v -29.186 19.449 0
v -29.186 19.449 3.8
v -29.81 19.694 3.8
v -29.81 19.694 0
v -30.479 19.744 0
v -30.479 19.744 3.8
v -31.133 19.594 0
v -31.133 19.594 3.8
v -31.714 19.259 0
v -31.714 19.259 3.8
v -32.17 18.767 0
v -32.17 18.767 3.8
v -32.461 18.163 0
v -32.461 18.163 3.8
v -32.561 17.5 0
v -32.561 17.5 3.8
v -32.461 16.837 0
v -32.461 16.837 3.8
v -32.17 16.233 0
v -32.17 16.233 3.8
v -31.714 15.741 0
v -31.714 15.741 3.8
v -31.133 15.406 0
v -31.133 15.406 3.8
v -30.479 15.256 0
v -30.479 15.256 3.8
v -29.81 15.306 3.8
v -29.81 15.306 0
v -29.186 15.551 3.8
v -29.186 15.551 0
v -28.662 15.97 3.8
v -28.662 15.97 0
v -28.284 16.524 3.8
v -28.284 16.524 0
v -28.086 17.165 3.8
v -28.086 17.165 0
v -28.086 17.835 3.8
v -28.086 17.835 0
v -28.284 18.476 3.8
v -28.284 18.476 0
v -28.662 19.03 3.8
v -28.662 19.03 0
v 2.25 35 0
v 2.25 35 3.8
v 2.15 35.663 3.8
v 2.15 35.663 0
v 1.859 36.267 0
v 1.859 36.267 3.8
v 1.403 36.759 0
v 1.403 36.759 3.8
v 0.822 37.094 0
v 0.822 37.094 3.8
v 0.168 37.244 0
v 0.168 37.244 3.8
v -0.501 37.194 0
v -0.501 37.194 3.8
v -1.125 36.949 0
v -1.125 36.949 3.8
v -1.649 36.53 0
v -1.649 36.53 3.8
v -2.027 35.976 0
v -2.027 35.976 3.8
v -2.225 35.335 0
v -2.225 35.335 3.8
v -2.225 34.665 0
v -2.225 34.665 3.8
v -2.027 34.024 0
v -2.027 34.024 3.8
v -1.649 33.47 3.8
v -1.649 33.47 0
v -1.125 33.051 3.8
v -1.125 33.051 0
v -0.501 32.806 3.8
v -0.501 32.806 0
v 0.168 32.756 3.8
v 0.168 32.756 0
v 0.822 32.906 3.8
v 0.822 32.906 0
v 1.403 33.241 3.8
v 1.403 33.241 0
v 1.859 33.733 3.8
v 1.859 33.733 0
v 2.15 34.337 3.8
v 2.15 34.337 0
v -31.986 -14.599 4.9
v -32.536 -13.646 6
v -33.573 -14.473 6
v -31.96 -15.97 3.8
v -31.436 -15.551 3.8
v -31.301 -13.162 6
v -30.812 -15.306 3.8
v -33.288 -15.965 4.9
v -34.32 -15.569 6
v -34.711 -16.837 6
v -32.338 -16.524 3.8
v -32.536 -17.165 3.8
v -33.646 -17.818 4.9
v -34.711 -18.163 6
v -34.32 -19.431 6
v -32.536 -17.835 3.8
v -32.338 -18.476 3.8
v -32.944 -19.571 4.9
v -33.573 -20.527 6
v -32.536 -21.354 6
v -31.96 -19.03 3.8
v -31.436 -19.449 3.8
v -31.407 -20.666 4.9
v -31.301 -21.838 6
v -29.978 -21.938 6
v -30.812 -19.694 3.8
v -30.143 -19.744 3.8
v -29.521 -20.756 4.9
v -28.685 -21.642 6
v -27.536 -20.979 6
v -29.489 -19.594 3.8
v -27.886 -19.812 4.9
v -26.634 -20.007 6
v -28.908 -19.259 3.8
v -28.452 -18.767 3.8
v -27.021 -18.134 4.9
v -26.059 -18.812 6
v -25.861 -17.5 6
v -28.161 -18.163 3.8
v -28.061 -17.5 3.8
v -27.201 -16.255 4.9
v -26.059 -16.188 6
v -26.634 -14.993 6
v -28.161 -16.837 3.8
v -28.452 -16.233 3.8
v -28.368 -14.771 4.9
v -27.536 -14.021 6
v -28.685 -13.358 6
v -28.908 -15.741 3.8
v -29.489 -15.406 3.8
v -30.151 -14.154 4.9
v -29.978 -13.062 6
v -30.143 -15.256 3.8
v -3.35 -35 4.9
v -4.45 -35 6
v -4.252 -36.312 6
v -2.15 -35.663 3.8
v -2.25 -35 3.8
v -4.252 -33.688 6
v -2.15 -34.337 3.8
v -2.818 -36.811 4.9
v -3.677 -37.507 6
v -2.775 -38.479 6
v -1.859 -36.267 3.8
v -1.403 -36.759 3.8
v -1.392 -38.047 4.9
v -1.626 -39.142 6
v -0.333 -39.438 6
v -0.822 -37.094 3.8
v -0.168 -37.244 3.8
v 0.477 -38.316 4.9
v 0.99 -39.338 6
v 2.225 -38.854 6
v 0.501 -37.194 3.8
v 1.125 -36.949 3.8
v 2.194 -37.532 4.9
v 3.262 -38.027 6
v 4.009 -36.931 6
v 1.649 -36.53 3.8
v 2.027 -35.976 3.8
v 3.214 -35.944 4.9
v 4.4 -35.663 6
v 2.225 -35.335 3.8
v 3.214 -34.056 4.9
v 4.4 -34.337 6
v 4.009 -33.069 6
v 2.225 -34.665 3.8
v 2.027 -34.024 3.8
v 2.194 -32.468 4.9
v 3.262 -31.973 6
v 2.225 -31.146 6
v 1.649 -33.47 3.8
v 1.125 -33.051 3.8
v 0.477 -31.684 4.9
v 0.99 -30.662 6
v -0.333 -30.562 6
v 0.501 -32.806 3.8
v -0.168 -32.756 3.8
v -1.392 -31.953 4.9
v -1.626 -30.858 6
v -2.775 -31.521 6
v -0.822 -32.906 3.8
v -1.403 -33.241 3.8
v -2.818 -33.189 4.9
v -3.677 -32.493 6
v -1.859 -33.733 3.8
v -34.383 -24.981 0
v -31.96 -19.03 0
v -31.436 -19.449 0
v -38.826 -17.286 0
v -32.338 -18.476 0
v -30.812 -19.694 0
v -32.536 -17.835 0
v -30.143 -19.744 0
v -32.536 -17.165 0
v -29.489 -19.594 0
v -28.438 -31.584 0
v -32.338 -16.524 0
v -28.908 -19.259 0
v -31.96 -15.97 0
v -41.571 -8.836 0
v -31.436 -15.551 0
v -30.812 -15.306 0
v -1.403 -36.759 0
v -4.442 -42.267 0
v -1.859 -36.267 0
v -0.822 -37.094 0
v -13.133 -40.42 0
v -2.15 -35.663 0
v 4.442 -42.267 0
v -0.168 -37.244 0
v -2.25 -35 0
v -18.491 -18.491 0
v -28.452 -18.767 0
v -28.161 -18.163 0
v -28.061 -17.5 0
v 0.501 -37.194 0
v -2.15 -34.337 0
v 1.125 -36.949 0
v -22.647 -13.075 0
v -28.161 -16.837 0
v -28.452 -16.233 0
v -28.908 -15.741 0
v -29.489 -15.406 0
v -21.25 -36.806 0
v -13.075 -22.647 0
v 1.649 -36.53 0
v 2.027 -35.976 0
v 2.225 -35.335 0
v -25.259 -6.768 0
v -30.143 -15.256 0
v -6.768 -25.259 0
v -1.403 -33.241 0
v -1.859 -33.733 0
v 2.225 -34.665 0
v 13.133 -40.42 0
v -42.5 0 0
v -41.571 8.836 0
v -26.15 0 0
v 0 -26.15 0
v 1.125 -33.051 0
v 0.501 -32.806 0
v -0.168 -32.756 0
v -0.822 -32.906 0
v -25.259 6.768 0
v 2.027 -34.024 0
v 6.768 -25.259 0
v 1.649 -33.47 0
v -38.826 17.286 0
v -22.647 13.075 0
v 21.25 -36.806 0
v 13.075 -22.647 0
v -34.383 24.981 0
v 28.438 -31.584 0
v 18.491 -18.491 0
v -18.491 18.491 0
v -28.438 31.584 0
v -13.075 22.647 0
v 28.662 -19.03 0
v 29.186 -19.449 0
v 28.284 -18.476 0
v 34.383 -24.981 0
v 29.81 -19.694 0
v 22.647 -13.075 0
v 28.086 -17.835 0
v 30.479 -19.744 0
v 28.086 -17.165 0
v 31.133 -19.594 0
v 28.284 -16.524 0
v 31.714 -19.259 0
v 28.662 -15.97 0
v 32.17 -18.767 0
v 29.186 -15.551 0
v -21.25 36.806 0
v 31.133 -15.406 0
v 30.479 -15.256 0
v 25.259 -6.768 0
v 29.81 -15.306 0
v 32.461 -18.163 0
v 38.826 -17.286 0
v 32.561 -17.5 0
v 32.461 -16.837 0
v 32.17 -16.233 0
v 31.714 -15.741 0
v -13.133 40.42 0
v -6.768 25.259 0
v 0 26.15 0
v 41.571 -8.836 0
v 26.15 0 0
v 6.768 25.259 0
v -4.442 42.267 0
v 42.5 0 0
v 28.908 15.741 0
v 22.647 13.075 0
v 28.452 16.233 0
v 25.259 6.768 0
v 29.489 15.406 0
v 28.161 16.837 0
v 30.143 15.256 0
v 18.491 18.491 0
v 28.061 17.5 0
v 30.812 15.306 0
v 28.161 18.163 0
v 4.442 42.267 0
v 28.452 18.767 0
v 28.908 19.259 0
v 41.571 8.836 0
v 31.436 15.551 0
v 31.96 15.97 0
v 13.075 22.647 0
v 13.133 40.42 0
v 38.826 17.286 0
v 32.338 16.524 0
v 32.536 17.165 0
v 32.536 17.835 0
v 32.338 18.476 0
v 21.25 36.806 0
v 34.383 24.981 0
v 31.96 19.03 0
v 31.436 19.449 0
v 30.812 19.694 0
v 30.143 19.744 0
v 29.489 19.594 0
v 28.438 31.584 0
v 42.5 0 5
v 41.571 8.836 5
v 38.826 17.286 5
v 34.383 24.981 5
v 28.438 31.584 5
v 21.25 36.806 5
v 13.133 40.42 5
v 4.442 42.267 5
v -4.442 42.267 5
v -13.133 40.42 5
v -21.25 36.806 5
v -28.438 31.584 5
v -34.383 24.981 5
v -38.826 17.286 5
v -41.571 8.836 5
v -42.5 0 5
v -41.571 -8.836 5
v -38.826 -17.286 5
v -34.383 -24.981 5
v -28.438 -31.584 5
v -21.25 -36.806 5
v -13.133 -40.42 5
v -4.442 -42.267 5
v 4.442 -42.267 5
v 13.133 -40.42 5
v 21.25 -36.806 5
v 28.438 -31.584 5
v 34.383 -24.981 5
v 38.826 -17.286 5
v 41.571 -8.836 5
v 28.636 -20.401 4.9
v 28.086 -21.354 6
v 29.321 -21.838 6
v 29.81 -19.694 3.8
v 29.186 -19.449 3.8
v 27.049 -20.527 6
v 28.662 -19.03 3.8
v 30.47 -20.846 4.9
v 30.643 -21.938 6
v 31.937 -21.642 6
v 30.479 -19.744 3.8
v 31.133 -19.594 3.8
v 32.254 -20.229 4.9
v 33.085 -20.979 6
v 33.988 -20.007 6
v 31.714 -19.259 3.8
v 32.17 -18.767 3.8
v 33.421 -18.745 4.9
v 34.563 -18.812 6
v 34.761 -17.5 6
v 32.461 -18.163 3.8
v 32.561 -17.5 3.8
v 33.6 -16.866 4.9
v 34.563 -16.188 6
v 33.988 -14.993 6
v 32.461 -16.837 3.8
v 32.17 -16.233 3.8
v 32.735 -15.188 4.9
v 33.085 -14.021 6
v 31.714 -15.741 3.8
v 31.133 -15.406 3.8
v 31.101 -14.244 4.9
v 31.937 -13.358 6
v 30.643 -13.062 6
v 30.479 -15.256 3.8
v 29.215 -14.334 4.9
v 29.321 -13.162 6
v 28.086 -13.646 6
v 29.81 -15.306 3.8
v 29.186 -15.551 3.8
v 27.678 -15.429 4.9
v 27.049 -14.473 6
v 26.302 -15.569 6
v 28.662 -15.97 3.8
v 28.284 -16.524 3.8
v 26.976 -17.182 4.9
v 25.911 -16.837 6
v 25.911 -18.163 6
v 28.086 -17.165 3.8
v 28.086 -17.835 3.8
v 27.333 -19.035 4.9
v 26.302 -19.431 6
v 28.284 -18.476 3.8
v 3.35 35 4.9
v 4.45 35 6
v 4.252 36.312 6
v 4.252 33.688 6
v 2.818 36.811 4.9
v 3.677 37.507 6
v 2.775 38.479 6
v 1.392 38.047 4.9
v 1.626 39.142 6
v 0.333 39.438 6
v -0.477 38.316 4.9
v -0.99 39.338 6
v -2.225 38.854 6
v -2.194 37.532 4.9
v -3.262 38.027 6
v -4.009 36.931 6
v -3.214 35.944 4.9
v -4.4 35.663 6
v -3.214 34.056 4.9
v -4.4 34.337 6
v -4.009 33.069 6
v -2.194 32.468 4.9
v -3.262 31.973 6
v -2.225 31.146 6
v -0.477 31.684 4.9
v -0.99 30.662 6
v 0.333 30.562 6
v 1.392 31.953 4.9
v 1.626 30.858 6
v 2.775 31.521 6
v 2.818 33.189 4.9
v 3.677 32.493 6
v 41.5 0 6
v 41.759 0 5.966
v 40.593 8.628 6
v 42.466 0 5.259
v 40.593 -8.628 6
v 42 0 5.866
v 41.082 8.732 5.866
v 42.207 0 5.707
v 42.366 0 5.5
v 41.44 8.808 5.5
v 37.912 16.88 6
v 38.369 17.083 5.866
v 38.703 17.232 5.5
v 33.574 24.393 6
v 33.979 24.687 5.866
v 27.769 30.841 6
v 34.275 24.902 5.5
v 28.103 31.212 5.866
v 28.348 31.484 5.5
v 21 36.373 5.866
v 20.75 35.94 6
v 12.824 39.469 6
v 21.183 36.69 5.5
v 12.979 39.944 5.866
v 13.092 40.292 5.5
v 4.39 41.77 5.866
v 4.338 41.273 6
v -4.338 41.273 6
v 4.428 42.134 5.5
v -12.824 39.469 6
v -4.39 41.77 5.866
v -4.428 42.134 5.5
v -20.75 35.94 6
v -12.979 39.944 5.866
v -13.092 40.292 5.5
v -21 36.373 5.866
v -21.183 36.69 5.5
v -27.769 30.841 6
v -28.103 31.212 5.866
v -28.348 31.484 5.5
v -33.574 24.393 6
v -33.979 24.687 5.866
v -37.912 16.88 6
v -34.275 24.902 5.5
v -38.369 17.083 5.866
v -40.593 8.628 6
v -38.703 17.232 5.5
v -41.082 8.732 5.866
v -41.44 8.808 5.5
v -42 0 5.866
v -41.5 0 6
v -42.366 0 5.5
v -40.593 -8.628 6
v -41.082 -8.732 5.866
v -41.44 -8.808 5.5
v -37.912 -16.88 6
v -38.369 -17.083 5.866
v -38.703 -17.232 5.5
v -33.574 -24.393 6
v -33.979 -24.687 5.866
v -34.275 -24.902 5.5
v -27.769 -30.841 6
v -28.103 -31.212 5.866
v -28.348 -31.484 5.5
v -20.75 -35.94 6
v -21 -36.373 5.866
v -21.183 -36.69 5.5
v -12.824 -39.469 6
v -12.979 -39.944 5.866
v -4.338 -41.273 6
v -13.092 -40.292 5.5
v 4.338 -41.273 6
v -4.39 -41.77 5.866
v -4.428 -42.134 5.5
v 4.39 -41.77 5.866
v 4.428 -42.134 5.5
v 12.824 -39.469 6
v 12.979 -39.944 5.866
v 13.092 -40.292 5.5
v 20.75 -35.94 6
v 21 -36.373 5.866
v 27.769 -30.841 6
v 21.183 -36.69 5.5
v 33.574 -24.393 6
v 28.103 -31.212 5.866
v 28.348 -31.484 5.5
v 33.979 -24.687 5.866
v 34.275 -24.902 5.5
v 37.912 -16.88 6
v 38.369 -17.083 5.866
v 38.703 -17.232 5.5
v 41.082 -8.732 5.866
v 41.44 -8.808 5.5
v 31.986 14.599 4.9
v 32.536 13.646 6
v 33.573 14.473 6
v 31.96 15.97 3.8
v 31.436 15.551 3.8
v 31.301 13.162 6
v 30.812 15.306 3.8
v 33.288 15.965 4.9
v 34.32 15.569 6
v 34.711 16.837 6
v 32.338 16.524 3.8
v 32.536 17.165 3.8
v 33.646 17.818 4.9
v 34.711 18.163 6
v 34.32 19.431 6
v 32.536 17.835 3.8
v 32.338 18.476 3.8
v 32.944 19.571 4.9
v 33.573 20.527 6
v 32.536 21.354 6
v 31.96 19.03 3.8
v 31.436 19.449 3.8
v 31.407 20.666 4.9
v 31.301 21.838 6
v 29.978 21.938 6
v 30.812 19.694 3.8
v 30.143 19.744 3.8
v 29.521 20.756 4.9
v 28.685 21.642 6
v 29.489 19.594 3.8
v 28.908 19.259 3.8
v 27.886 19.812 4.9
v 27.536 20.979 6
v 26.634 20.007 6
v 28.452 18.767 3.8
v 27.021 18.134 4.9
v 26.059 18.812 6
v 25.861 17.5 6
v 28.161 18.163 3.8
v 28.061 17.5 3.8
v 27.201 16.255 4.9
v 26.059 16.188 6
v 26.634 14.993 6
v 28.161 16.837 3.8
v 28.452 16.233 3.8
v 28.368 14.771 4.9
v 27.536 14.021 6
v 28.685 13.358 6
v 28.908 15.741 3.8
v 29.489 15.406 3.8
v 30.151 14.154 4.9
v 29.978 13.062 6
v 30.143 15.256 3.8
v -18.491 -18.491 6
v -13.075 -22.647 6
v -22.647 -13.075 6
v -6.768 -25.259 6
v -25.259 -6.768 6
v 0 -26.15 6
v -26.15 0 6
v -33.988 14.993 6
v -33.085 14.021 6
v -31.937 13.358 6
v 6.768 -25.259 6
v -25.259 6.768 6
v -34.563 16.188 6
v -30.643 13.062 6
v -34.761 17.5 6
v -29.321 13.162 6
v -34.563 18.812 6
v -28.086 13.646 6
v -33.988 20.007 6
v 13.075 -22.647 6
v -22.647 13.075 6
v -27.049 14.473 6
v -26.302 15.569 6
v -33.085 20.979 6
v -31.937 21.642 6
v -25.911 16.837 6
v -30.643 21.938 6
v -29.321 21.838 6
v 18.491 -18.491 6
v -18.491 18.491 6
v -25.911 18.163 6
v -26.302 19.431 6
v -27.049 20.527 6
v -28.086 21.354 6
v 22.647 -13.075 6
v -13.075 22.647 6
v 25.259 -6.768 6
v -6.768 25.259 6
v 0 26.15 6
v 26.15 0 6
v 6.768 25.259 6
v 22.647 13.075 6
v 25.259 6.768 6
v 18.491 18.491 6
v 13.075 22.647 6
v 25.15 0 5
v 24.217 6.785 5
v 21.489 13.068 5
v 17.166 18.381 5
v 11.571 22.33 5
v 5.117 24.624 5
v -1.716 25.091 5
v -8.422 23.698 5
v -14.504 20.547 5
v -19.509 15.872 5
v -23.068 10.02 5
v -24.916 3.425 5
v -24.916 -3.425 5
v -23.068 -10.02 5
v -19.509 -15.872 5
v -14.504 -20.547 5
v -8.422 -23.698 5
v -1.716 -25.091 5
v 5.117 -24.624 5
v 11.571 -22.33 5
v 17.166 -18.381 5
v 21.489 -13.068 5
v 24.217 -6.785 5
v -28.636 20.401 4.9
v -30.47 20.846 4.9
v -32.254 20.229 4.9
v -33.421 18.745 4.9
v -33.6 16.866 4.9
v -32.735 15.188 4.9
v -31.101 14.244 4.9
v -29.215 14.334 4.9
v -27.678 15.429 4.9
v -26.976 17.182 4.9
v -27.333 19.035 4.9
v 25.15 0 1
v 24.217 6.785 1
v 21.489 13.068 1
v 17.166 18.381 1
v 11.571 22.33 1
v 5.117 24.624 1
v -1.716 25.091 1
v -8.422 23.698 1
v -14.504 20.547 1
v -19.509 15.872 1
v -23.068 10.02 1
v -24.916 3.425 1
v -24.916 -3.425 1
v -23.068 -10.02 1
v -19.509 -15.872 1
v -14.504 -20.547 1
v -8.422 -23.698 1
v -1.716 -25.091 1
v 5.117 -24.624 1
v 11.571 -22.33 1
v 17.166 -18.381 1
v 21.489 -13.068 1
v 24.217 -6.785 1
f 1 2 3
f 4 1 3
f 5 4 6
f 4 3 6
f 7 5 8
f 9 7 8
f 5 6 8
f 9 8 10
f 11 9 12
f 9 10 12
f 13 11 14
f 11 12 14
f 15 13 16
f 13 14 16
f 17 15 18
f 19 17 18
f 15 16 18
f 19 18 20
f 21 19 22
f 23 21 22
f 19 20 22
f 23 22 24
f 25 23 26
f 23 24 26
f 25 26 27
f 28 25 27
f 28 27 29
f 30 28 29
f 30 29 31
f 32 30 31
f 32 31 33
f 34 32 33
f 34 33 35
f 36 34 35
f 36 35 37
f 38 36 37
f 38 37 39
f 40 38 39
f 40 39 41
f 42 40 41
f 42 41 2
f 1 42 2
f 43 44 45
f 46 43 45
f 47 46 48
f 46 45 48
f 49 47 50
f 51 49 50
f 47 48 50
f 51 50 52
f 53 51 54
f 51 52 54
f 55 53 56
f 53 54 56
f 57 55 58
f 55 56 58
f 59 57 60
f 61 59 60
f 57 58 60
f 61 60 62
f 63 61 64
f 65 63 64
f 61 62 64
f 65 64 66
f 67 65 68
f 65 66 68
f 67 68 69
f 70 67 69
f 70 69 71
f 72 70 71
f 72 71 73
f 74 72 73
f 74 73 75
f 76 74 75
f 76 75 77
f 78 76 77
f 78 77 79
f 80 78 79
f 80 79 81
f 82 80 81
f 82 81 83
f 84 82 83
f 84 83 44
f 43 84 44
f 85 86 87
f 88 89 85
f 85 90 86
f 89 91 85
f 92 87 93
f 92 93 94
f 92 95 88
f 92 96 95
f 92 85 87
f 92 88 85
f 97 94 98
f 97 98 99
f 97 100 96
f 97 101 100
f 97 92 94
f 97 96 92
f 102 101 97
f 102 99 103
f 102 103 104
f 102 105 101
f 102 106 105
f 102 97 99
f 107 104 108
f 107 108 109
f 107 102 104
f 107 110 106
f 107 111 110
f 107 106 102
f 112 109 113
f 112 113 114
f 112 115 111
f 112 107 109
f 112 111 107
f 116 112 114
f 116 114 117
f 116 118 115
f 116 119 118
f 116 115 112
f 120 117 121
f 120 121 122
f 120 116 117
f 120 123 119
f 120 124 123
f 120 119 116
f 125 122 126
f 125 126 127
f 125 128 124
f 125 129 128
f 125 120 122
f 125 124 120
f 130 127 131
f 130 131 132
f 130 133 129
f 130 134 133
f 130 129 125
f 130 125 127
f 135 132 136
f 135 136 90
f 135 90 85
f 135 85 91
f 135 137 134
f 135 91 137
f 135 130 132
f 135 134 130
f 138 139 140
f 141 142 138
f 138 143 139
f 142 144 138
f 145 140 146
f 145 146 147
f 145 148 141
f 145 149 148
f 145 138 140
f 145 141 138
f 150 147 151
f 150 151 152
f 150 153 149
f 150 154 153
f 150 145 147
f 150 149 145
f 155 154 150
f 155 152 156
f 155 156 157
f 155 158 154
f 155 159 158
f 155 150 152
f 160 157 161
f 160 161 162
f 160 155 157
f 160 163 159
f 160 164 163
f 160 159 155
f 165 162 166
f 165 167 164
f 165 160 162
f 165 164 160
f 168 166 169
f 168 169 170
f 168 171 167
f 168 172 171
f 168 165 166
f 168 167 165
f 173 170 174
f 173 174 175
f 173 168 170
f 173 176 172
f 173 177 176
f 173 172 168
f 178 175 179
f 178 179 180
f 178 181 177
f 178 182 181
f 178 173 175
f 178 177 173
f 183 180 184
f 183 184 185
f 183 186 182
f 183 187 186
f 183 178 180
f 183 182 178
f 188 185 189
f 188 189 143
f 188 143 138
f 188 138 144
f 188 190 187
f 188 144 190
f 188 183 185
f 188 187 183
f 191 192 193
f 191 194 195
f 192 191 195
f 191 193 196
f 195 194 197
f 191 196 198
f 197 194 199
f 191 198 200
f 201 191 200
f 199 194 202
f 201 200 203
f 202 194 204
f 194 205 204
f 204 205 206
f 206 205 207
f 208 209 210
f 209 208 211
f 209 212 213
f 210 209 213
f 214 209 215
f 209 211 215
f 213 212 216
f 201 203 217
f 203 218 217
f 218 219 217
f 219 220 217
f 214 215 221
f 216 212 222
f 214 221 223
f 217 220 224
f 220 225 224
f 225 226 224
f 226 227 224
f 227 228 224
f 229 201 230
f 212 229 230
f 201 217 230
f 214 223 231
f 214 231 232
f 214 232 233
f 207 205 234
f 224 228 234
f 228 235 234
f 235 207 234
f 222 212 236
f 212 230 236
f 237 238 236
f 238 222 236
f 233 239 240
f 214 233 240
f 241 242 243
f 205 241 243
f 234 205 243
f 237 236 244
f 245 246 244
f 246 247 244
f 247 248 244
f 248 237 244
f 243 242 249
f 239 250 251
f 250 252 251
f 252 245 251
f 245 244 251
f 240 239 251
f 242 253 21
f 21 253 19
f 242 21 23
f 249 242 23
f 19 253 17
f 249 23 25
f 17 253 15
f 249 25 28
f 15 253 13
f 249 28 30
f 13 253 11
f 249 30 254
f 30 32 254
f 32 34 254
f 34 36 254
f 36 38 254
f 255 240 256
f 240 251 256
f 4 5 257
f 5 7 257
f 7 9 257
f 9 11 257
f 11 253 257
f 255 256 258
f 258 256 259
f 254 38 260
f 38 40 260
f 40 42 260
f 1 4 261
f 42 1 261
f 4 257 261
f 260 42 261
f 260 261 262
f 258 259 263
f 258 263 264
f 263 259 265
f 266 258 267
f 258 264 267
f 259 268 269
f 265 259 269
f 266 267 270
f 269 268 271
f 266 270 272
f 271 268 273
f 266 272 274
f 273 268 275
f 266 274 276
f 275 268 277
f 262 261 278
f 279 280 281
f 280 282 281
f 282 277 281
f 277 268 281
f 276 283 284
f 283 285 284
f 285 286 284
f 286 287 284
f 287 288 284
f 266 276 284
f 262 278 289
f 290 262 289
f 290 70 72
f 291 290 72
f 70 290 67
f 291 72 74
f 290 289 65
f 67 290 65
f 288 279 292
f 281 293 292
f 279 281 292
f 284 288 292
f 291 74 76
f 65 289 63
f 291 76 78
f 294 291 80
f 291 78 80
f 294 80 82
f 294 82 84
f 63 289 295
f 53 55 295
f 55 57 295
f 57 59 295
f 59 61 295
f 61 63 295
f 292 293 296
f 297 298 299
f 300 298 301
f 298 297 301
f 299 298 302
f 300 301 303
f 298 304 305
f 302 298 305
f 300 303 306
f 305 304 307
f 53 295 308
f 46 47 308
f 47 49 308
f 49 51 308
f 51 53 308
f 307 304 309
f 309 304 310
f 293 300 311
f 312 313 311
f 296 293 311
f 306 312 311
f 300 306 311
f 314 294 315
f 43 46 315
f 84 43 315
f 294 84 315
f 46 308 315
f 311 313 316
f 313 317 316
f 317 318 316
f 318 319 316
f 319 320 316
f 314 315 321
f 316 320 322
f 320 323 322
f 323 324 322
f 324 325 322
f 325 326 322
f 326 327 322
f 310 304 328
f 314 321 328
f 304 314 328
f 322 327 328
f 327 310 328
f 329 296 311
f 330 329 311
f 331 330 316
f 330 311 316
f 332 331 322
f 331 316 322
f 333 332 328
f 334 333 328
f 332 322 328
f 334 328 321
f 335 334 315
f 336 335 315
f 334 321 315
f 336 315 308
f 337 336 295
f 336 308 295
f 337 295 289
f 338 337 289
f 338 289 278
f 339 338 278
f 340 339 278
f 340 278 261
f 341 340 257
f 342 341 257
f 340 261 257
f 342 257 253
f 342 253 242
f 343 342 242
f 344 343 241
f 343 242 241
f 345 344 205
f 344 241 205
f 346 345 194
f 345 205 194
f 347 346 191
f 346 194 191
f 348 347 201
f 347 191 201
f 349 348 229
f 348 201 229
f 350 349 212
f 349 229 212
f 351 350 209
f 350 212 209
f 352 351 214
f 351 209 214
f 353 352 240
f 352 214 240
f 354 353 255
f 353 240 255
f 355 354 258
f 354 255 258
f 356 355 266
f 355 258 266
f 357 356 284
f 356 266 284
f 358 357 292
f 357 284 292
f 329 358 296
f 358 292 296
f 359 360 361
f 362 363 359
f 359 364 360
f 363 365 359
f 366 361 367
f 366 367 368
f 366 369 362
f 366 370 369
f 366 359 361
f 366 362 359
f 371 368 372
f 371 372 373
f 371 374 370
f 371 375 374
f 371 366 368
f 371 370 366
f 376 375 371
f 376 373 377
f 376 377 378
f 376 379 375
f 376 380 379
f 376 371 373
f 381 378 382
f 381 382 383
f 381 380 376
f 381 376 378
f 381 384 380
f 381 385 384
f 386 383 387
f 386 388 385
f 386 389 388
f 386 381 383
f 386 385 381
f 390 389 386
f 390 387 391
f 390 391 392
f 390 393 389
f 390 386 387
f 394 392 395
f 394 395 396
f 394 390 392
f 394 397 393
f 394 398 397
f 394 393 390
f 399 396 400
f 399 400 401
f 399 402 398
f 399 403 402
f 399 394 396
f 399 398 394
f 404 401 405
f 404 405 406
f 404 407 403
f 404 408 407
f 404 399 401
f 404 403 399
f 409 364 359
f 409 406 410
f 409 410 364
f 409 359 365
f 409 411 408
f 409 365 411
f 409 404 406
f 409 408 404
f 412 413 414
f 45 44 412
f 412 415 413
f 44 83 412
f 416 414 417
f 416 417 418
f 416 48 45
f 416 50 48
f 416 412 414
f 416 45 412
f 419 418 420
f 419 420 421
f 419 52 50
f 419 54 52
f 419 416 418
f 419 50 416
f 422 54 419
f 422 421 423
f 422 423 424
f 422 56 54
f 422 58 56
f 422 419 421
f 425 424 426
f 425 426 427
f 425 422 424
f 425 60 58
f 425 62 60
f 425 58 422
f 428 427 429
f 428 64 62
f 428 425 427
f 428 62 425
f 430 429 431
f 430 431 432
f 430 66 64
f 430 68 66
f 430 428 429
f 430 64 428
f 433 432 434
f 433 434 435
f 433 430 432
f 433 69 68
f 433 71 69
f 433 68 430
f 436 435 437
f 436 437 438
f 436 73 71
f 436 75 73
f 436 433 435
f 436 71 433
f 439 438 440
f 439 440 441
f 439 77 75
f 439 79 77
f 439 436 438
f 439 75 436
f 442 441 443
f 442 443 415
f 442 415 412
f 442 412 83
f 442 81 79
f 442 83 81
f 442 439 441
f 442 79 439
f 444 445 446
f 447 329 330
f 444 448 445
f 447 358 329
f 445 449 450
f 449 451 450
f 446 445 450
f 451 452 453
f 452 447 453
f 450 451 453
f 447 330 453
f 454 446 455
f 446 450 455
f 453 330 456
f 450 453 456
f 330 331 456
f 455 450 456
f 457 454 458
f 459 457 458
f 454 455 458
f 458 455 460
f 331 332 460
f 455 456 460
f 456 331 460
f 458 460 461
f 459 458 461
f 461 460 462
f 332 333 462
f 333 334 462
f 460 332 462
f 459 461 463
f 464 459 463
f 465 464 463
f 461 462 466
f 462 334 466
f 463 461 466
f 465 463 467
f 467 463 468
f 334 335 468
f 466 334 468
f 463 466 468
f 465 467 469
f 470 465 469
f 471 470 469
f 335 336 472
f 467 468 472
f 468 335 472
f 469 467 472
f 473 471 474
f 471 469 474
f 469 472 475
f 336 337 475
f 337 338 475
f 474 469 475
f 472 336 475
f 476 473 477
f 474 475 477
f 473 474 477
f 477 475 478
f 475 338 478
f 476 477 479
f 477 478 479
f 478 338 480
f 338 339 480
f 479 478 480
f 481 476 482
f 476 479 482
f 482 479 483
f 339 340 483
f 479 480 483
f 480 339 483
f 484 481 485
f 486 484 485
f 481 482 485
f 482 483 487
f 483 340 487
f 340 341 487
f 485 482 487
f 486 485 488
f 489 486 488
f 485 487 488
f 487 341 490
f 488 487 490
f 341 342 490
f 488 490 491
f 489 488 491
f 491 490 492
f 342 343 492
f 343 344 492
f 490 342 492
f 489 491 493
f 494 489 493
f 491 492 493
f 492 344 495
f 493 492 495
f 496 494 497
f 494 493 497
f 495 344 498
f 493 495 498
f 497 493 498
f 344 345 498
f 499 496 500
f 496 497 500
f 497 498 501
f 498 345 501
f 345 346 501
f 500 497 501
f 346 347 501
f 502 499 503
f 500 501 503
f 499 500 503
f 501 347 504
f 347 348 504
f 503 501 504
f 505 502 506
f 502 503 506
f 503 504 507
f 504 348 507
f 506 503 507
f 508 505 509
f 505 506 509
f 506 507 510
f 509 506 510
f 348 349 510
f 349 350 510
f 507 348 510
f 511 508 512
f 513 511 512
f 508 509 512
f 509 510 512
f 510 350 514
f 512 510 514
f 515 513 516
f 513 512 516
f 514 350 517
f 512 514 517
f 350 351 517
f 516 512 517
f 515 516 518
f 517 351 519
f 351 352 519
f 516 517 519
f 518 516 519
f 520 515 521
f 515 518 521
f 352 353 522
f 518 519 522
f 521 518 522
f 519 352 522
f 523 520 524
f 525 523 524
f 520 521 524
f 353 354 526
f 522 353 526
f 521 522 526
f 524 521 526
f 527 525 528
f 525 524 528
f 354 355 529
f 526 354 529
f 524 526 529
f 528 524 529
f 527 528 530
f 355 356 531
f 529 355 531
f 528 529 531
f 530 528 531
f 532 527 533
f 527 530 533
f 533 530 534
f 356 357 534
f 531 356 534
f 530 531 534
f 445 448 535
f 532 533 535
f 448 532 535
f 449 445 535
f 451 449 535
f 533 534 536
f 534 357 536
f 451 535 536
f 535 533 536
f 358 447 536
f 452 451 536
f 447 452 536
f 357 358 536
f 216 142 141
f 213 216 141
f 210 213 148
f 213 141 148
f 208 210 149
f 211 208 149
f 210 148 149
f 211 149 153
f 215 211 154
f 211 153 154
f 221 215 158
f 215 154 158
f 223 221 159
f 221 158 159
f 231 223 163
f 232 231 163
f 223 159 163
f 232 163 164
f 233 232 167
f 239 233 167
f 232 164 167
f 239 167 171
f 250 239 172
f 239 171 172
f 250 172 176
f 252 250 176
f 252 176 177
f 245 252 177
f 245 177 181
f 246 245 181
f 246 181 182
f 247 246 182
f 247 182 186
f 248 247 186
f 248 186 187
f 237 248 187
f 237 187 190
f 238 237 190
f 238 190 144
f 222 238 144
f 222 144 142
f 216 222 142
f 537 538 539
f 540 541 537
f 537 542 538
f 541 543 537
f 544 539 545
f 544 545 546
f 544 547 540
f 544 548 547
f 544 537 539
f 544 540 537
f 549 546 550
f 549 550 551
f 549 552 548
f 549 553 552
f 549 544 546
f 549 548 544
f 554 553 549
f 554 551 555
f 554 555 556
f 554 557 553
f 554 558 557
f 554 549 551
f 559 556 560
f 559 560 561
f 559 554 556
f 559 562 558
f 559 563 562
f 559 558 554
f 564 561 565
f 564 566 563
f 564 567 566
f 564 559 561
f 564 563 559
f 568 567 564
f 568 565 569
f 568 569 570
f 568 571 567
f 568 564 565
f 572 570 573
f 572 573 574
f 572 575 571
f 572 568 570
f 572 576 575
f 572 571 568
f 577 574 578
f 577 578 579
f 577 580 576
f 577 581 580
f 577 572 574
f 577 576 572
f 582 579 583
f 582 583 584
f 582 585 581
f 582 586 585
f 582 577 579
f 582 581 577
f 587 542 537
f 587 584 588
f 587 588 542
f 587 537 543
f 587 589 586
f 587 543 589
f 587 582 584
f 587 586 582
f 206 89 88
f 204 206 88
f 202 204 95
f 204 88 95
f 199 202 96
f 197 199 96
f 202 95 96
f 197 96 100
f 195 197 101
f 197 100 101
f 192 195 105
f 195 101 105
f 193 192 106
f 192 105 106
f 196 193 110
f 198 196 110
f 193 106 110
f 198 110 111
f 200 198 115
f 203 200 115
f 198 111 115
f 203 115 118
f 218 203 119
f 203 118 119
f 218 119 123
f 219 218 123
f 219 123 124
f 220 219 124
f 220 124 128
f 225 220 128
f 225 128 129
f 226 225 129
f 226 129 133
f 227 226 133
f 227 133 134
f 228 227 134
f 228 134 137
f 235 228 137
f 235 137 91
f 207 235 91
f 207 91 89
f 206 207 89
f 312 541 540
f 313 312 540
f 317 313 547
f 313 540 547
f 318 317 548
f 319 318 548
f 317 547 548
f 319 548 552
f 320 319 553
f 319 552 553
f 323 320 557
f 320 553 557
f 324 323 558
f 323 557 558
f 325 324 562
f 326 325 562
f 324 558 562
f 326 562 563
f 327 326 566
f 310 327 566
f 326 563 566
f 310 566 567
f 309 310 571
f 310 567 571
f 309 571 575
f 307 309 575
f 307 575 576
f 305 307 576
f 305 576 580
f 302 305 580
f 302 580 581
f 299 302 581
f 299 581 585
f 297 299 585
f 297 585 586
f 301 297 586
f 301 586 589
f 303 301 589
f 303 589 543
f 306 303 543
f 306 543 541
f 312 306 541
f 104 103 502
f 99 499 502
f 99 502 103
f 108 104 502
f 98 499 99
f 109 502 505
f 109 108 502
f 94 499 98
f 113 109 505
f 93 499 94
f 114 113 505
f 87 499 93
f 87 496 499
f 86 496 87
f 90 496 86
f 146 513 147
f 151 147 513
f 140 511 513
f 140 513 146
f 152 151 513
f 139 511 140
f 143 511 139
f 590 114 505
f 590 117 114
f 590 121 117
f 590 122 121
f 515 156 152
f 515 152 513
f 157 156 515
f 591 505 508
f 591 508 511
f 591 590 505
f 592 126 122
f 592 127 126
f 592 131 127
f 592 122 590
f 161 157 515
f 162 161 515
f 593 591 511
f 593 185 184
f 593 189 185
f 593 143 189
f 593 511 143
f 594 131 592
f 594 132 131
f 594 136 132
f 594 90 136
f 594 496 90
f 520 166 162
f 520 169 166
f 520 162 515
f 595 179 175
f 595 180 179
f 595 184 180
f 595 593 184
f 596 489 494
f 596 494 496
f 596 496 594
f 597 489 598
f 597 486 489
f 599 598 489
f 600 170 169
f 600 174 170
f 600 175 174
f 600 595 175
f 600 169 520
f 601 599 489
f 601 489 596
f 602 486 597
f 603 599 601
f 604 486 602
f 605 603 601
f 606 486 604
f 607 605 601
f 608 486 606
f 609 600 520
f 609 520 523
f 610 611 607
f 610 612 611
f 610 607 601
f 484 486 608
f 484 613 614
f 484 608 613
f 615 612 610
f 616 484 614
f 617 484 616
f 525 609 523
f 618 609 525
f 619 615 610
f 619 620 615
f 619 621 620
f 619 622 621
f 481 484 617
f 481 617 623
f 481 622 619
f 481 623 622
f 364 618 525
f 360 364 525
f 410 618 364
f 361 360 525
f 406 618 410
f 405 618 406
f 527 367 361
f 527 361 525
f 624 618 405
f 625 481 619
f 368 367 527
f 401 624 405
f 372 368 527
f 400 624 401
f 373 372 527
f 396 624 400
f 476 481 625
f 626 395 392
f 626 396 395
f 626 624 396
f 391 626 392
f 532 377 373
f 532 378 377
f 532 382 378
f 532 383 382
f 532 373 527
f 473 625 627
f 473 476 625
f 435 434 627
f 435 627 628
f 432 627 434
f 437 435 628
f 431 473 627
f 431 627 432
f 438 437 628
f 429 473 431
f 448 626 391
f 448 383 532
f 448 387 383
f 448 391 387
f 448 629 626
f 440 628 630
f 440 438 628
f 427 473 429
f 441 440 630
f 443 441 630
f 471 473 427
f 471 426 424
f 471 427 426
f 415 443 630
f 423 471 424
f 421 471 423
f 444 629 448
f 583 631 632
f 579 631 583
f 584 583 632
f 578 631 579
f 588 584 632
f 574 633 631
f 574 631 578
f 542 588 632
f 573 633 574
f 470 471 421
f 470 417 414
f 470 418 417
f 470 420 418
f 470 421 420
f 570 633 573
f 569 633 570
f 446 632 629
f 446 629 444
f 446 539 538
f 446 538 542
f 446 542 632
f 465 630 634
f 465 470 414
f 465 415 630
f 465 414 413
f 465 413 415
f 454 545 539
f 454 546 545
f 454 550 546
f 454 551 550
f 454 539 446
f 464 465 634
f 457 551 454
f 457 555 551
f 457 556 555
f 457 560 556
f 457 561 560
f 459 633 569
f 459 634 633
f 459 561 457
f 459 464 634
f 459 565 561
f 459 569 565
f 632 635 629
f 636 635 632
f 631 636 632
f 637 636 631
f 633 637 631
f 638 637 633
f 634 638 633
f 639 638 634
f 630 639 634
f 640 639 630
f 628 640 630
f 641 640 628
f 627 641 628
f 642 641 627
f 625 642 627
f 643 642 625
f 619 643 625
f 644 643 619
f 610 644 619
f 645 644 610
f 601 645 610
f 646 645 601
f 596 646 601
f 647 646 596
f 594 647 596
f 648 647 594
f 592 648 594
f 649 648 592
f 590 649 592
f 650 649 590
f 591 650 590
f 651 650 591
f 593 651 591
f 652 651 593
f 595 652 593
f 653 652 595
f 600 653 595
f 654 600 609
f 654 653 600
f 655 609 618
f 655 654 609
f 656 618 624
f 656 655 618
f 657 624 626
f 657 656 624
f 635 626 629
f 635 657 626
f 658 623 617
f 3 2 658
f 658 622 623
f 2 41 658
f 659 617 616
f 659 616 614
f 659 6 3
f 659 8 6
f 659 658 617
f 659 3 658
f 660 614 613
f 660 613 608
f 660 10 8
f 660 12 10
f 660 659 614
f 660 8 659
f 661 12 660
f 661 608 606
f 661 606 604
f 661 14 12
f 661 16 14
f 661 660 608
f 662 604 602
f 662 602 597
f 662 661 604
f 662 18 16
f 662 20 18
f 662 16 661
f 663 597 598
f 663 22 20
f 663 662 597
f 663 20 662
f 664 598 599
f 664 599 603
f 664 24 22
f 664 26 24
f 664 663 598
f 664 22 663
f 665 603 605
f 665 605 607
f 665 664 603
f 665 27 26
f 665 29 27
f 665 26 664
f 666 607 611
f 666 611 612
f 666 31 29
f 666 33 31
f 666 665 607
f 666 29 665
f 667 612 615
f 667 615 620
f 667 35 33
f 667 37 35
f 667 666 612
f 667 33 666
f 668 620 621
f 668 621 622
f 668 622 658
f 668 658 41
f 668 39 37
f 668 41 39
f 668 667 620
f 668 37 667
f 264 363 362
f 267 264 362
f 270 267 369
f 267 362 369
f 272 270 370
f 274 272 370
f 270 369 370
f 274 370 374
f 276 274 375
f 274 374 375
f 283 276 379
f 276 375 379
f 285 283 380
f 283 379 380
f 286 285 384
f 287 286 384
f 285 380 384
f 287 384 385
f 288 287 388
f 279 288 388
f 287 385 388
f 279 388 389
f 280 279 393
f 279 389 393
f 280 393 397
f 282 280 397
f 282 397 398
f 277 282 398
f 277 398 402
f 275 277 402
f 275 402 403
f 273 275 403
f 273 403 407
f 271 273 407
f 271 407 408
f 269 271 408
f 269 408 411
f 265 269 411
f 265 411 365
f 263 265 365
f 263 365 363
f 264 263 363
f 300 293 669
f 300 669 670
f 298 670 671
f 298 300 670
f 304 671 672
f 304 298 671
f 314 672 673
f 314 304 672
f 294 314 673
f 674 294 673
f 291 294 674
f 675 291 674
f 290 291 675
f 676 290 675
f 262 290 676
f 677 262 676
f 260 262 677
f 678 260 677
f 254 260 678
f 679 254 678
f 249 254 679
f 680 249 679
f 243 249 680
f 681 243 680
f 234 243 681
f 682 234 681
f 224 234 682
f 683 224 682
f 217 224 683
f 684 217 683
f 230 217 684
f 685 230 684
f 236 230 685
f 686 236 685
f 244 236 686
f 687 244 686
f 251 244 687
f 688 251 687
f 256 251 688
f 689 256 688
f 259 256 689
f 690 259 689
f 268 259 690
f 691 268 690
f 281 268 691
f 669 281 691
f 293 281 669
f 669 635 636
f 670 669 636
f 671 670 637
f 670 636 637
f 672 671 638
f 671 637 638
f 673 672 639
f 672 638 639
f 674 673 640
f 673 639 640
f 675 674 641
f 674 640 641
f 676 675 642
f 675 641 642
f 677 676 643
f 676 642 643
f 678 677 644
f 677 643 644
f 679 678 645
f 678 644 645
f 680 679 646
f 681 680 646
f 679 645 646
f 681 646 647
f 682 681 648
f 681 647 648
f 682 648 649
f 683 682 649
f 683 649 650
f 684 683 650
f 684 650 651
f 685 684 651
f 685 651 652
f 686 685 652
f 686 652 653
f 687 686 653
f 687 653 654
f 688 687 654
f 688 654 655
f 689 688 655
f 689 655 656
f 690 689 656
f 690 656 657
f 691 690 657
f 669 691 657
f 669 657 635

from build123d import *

# Parameters (mm, degrees)
SKETCH1_R                    = 42.5
BOSS_EXTRUDE1_DEPTH          = 6
SKETCH2_R                    = 25.15
CUT_EXTRUDE1_DEPTH           = 61.402814504
SKETCH3_R                    = 2.25
CUT_EXTRUDE2_DEPTH           = 61.402814504
CHAMFER2_SIZE                = 2.2
CIRPATTERN1_COUNT            = 6
CHAMFER2_OF_CIRPATTERN1_SIZE = 2.2
CHAMFER1_SIZE                = 1
FILLET1_R                    = 1


with BuildPart() as part:
    # Sketch1 → Boss-Extrude1 (new body)
    with BuildSketch(Plane.XY):
        Circle(SKETCH1_R)
    extrude(amount=BOSS_EXTRUDE1_DEPTH)

    # Sketch2 → Cut-Extrude1 (cut, through all)
    with BuildSketch(Plane.XY.offset(6)):
        Circle(SKETCH2_R)
    extrude(amount=-CUT_EXTRUDE1_DEPTH, mode=Mode.SUBTRACT)

    # Sketch3 → Cut-Extrude2 (cut, through all)
    with BuildSketch(Plane.XY.offset(6)):
        with Locations((0, 35)):
            Circle(SKETCH3_R)
    cut_extrude2 = extrude(amount=-CUT_EXTRUDE2_DEPTH, mode=Mode.SUBTRACT)

    # Chamfer2
    chamfer2_edges = [part.edges().sort_by_distance(p)[0] for p in [
        (-2.25, 35, 6),
    ]]
    chamfer(chamfer2_edges, length=CHAMFER2_SIZE)

    # CirPattern1: Cut-Extrude2 ×6 about axis
    cirpattern1_axis = Axis((0, 0, 0), (0, 0, 1))
    for i in range(1, CIRPATTERN1_COUNT):
        add(cut_extrude2.rotate(cirpattern1_axis, i * 360 / CIRPATTERN1_COUNT), mode=Mode.SUBTRACT)

    # Chamfer2 of CirPattern1
    chamfer2_of_cirpattern1_edges = [part.edges().sort_by_distance(p)[0] for p in [
        (-31.435889132, 15.551442841, 6),
        (-29.185889132, -19.448557159, 6),
        (2.25, -35, 6),
        (31.435889132, -15.551442841, 6),
        (29.185889132, 19.448557159, 6),
    ]]
    chamfer(chamfer2_of_cirpattern1_edges, length=CHAMFER2_OF_CIRPATTERN1_SIZE)

    # Chamfer1
    chamfer1_edges = [part.edges().sort_by_distance(p)[0] for p in [
        (-25.15, 0, 0),
        (-25.15, 0, 6),
    ]]
    chamfer(chamfer1_edges, length=CHAMFER1_SIZE)

    # Fillet1
    fillet1_edges = [part.edges().sort_by_distance(p)[0] for p in [
        (-42.5, 0, 6),
    ]]
    fillet(fillet1_edges, radius=FILLET1_R)


solid = part.part
